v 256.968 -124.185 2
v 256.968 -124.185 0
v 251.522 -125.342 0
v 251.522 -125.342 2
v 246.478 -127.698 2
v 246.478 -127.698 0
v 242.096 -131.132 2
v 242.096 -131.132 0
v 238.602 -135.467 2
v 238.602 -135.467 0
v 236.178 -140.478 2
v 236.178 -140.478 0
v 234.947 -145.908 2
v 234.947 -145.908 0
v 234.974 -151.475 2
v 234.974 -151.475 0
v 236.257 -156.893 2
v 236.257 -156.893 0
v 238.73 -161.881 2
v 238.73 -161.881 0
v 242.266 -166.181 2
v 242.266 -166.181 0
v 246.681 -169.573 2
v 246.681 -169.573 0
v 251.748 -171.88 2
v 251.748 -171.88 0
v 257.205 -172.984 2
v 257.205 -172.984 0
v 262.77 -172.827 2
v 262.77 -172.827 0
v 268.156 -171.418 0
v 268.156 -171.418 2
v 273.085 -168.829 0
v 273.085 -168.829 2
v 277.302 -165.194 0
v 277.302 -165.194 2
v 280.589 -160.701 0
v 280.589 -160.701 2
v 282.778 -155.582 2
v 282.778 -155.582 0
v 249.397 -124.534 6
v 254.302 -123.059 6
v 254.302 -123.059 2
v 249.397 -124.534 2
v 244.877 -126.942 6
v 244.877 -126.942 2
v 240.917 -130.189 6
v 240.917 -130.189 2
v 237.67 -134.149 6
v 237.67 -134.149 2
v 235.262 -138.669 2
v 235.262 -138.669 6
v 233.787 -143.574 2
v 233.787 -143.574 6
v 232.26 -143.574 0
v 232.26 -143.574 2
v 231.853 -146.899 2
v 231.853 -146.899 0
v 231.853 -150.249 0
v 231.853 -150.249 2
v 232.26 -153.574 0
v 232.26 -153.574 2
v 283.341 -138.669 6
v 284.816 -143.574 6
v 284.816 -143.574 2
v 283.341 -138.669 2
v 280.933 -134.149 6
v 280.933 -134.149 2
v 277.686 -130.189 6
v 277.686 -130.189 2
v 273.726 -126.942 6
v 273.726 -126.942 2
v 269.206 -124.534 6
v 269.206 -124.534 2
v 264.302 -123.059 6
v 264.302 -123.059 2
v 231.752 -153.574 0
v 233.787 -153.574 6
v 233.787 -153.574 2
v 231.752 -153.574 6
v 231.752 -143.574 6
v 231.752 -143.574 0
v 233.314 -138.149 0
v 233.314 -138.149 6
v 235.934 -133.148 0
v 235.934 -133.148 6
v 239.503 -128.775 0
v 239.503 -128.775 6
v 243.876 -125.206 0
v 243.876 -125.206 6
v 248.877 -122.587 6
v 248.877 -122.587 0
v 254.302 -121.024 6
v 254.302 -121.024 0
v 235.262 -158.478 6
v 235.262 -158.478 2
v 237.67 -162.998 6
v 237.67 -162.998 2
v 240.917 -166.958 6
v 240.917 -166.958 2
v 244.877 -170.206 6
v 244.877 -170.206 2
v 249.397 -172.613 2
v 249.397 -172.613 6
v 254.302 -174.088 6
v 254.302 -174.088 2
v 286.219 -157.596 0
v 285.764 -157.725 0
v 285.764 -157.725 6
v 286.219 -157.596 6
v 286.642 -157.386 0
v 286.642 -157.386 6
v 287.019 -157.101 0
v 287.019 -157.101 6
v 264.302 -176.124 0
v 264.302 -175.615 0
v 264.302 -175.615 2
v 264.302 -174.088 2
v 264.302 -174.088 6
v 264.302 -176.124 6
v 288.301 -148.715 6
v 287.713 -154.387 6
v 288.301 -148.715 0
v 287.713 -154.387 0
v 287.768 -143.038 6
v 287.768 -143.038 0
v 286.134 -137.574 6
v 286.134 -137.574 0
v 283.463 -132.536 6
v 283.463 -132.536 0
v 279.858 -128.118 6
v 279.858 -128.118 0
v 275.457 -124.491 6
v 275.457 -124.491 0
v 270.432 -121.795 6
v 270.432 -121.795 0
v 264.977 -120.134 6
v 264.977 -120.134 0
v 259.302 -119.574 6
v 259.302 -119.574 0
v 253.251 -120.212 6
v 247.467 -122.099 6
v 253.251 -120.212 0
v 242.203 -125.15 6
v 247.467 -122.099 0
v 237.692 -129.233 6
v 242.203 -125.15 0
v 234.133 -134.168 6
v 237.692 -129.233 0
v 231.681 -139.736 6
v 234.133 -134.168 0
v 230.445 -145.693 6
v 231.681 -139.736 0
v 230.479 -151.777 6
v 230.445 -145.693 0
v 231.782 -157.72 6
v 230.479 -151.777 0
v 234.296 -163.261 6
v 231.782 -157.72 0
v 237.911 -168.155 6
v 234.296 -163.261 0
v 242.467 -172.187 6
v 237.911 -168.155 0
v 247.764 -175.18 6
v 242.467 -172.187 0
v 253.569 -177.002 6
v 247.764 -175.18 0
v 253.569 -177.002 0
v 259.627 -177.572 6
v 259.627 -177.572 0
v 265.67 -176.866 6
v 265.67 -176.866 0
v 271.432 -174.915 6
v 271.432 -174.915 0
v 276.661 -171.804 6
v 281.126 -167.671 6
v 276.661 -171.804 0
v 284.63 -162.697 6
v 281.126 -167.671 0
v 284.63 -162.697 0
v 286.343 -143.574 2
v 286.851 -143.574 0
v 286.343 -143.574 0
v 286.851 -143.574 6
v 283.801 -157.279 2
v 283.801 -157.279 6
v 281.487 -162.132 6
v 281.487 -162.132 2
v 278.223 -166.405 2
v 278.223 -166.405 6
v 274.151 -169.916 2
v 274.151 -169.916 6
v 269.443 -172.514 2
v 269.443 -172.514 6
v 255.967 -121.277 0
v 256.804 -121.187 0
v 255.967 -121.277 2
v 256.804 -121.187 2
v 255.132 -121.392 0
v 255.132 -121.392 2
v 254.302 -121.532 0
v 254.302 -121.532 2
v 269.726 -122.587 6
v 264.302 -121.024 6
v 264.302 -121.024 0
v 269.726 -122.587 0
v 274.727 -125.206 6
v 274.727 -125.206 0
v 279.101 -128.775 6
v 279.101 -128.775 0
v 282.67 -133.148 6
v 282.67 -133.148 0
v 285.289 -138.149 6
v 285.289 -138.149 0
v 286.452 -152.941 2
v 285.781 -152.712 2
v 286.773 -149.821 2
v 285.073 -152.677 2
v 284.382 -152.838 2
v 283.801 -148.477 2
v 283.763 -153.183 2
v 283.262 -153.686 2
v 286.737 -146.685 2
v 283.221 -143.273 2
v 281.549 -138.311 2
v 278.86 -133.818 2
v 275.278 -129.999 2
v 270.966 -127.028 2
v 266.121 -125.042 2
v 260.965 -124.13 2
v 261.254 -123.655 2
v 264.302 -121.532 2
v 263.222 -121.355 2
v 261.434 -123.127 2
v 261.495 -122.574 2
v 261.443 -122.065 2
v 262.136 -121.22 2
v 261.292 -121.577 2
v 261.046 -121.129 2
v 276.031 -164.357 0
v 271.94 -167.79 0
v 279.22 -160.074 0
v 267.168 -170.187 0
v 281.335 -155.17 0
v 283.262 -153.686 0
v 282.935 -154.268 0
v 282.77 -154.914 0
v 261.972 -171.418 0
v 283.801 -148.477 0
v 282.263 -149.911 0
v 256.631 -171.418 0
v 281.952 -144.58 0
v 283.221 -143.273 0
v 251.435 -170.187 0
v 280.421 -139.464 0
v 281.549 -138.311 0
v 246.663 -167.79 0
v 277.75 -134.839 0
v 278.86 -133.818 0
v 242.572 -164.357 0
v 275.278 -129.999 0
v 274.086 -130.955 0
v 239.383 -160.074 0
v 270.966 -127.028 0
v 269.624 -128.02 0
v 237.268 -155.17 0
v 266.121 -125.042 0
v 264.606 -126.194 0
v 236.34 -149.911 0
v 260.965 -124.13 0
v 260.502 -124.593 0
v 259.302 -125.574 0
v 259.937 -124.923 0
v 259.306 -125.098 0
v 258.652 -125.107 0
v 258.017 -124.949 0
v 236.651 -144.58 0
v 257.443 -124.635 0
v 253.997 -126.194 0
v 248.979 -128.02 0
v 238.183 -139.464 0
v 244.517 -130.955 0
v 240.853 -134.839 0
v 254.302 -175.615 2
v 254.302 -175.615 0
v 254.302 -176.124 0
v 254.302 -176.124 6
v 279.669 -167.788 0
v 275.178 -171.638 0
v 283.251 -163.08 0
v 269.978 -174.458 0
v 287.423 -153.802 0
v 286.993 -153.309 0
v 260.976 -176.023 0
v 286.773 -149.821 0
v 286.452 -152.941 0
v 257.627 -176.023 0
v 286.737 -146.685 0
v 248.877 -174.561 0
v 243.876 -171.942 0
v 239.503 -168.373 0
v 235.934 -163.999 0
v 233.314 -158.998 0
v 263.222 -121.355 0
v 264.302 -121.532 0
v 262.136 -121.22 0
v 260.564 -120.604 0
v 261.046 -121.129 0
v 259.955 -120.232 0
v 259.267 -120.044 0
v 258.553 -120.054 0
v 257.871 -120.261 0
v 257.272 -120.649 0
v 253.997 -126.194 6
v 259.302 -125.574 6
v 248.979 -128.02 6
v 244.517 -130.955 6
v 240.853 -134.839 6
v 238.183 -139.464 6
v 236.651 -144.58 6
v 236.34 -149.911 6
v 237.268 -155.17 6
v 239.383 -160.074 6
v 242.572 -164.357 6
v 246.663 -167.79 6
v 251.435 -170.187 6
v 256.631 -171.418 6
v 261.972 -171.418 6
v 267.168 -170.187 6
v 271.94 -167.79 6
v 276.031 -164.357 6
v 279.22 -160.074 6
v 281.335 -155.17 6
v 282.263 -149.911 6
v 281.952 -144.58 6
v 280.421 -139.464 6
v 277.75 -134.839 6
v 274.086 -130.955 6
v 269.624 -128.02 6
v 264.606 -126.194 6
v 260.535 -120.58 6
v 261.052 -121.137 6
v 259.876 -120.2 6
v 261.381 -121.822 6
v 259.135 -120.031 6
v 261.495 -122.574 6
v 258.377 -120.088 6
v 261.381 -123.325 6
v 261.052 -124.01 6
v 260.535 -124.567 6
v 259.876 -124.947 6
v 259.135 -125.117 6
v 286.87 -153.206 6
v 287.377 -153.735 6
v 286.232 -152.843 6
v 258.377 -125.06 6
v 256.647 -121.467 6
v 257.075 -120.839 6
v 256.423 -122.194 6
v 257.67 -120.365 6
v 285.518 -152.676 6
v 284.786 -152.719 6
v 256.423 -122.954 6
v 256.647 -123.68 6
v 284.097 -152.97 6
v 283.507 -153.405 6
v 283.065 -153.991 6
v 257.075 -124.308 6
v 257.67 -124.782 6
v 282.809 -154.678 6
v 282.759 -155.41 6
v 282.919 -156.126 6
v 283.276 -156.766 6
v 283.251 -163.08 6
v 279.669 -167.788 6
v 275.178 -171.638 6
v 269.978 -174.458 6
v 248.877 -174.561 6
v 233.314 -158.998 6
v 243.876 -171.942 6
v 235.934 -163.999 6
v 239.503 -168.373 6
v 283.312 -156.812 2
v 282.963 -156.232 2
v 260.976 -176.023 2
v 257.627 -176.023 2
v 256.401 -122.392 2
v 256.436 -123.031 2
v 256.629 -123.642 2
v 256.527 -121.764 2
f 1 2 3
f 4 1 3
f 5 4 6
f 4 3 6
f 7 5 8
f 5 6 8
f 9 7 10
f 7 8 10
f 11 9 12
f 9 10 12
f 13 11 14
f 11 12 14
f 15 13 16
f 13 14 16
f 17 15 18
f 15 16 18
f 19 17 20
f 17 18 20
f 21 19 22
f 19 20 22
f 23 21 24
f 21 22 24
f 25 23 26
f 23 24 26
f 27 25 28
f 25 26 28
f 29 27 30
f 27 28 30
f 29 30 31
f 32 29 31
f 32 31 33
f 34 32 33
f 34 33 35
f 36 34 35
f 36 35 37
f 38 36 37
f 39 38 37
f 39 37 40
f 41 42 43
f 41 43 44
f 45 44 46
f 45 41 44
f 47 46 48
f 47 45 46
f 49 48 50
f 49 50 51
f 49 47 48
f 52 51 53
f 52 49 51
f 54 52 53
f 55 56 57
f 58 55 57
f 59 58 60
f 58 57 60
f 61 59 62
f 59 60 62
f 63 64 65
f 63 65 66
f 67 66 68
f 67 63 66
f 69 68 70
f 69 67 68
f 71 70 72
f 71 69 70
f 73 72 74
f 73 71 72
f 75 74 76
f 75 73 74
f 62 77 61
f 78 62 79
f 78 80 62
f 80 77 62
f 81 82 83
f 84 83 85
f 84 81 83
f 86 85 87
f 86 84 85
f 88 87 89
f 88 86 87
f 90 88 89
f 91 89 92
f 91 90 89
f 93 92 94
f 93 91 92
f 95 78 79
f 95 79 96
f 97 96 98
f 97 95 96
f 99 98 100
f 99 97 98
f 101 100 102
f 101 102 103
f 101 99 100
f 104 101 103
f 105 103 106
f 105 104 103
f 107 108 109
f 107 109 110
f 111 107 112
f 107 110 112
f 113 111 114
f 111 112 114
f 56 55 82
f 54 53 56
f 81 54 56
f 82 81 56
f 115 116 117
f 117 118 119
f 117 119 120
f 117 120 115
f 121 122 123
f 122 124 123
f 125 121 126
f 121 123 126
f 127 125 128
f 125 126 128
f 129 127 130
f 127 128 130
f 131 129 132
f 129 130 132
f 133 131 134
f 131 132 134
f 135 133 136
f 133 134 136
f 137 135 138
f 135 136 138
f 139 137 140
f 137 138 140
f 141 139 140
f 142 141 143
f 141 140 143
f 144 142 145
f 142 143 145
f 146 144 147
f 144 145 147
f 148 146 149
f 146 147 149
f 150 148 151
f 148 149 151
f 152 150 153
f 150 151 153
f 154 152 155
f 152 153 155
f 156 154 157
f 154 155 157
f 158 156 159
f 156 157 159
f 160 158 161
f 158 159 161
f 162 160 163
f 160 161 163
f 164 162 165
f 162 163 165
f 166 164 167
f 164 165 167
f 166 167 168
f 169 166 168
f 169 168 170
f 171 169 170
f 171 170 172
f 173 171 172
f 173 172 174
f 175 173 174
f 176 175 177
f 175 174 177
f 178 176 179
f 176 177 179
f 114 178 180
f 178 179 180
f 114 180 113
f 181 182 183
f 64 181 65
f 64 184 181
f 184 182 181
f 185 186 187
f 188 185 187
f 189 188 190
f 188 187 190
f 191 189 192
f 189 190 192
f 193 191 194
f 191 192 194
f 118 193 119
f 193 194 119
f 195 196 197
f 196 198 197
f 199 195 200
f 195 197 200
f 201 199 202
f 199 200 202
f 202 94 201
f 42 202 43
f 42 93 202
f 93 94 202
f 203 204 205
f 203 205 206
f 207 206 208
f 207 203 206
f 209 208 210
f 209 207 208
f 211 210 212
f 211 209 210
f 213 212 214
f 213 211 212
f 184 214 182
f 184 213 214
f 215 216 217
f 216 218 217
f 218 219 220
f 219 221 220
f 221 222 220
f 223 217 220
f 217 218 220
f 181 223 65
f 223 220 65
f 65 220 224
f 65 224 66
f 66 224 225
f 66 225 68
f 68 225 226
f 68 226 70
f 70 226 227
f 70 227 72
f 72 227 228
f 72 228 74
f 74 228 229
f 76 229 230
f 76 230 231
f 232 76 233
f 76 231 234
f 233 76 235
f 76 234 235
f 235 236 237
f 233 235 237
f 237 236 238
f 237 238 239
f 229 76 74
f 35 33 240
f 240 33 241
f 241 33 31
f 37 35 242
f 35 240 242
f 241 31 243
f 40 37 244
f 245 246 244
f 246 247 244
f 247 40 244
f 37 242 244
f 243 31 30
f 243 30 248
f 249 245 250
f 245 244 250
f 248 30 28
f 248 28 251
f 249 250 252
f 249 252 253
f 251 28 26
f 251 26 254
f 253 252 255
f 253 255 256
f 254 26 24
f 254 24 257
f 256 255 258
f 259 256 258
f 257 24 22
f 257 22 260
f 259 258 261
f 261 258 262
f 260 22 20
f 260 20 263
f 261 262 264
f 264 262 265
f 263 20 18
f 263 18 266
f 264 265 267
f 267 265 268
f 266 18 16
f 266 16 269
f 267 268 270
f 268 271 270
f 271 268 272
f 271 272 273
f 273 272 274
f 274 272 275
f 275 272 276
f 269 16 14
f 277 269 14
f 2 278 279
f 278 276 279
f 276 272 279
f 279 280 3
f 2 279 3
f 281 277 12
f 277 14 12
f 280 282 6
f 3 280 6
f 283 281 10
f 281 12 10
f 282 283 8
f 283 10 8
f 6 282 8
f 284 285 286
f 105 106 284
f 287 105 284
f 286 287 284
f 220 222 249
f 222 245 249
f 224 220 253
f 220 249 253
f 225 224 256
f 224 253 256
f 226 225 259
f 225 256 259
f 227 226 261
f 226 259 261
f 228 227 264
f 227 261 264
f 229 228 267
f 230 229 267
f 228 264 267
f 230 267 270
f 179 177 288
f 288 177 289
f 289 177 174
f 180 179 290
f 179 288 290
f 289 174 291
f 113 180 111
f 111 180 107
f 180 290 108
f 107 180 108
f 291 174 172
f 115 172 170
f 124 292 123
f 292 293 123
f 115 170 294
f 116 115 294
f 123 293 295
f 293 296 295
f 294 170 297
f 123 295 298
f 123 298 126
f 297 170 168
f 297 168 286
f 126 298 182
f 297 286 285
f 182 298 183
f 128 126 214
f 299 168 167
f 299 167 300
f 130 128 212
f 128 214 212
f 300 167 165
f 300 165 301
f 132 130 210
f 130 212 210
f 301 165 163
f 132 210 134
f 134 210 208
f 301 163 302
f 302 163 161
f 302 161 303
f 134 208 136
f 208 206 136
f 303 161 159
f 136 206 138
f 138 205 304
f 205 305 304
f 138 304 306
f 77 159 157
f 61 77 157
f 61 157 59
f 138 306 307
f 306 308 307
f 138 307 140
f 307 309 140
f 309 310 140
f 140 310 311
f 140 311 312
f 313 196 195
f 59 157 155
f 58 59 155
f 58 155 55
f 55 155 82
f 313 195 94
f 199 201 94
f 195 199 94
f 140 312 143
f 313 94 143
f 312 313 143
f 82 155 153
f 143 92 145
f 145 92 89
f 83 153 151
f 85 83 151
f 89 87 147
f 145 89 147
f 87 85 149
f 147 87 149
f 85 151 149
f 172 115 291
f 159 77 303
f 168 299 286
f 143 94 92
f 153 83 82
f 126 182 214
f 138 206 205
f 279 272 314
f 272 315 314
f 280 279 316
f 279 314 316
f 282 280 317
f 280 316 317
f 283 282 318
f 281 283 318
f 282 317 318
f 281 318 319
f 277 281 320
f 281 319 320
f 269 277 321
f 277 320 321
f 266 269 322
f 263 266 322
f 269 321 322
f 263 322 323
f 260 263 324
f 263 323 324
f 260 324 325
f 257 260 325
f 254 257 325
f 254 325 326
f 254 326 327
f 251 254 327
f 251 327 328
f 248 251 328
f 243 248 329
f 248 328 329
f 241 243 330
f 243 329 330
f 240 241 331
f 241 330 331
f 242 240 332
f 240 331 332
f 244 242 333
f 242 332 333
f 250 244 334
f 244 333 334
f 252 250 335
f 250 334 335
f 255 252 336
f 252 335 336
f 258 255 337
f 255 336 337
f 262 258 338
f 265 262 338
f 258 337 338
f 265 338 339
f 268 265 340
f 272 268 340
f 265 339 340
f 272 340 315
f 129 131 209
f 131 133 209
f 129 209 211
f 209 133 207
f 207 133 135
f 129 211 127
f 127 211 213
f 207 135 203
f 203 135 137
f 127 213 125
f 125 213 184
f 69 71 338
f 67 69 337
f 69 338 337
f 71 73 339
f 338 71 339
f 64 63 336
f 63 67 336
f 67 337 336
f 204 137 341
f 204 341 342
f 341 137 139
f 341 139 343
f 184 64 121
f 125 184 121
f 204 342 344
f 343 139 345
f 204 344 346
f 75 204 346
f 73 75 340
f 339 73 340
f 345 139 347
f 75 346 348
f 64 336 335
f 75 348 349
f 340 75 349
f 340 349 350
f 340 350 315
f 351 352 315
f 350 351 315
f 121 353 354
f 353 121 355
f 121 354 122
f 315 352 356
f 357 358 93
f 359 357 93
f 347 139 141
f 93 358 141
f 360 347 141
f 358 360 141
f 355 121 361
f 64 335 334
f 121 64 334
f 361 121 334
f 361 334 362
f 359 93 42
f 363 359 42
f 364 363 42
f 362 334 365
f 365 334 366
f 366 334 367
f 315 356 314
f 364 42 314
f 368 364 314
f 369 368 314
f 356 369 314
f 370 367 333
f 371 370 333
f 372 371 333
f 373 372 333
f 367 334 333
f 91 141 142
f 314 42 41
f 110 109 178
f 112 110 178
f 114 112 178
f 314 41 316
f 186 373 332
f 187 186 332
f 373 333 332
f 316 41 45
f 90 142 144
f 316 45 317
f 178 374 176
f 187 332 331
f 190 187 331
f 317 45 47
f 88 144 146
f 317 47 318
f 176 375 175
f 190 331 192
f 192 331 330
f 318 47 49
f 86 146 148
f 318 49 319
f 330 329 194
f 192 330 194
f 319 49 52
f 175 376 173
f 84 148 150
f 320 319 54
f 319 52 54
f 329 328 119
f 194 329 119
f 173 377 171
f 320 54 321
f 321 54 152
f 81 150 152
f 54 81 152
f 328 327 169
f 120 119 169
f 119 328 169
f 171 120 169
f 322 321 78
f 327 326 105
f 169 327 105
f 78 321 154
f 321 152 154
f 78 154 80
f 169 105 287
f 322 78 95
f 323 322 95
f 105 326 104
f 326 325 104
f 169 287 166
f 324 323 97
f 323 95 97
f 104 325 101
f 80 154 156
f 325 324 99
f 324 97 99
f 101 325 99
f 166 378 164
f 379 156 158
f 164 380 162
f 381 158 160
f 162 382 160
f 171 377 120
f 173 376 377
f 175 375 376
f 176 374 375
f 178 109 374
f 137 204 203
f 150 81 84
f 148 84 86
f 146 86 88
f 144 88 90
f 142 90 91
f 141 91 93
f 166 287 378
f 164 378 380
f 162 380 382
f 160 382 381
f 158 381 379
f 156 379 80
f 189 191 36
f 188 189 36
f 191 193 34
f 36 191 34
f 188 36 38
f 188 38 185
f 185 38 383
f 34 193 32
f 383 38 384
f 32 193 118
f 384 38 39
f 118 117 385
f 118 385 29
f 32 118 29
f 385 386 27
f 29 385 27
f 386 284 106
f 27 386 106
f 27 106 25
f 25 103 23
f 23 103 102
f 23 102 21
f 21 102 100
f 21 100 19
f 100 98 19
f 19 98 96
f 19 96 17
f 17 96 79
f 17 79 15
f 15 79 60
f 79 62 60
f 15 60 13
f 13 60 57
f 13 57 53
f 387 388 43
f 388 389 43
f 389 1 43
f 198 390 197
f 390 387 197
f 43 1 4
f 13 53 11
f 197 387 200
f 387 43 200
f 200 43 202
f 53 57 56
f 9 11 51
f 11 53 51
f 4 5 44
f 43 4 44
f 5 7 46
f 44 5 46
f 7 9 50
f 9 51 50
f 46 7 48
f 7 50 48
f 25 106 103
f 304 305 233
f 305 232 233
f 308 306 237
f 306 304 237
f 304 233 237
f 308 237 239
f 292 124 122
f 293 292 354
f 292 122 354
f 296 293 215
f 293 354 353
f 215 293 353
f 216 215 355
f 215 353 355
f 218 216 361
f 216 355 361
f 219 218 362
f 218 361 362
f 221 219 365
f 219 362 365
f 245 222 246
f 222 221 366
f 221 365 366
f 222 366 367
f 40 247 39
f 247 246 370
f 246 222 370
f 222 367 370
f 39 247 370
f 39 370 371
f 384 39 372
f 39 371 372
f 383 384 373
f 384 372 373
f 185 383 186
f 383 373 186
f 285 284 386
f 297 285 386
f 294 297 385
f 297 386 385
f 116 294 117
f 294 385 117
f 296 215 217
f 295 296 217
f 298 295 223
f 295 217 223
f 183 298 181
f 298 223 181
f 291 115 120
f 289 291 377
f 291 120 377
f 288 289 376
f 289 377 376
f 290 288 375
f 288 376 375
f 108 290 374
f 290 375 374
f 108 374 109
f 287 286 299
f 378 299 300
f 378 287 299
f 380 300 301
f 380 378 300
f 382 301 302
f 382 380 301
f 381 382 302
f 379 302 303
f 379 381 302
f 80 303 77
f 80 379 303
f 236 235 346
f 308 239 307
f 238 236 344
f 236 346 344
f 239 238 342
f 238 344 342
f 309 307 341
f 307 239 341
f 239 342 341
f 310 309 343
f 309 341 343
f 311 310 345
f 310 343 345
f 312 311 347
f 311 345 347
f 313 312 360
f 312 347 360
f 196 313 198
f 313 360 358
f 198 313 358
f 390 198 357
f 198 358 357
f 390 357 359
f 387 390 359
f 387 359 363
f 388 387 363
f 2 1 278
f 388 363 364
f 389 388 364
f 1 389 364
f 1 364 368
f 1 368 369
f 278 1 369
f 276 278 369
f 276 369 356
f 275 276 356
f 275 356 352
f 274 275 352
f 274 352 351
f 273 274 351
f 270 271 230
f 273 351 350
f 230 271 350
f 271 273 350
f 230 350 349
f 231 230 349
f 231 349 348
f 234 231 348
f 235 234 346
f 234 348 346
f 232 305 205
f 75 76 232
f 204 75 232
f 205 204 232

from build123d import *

# Parameters (mm, degrees)
CUT_EXTRUDE1_DEPTH = 7
SKETCH4_R          = 2.55
CUT_EXTRUDE2_DEPTH = 7


with BuildPart() as part:
    # Sketch2 → Revolve1 (revolve)
    with BuildSketch(Plane.ZY.offset(-259.301545348)):
        Polygon((0, -124.073704322), (0, -125.573704322), (6, -125.573704322), (6, -119.573704322), (0, -119.573704322), (0, -121.073704322), (2, -121.073704322), (2, -124.073704322), align=None)
    revolve(axis=Axis((259.301545348, -148.573704322, 22.865), (0, 0, 1)))

    # Sketch3 → Cut-Extrude1 (cut, through all)
    with BuildSketch(Plane.XY.offset(6)):
        with BuildLine():
            Line((254.301545348, -174.088405967), (254.301545348, -176.12365895))
            ThreePointArc((254.301545348, -176.12365895), (239.502555475, -168.372694195), (231.75159072, -153.573704322))
            Line((231.75159072, -153.573704322), (233.786843704, -153.573704322))
            ThreePointArc((233.786843704, -153.573704322), (240.916769037, -166.958480633), (254.301545348, -174.088405967))
        make_face()
        with BuildLine():
            Line((264.301545348, -174.088405967), (264.301545348, -176.12365895))
            ThreePointArc((264.301545348, -176.12365895), (279.100535221, -168.372694195), (286.851499976, -153.573704322))
            Line((286.851499976, -153.573704322), (284.816246992, -153.573704322))
            ThreePointArc((284.816246992, -153.573704322), (277.686321659, -166.958480633), (264.301545348, -174.088405967))
        make_face()
        with BuildLine():
            Line((286.851499976, -143.573704322), (284.816246992, -143.573704322))
            ThreePointArc((284.816246992, -143.573704322), (277.686321659, -130.188928011), (264.301545348, -123.059002678))
            Line((264.301545348, -123.059002678), (264.301545348, -121.023749694))
            ThreePointArc((264.301545348, -121.023749694), (279.100535221, -128.774714449), (286.851499976, -143.573704322))
        make_face()
        with BuildLine():
            Line((254.301545348, -121.023749694), (254.301545348, -123.059002678))
            ThreePointArc((254.301545348, -123.059002678), (240.916769037, -130.188928011), (233.786843704, -143.573704322))
            Line((233.786843704, -143.573704322), (231.75159072, -143.573704322))
            ThreePointArc((231.75159072, -143.573704322), (239.502555475, -128.774714449), (254.301545348, -121.023749694))
        make_face()
    extrude(amount=-CUT_EXTRUDE1_DEPTH, mode=Mode.SUBTRACT)

    # Sketch4 → Cut-Extrude2 (cut, through all)
    with BuildSketch(Plane.XY.offset(6)):
        with Locations((258.944661735, -122.573704322)):
            Circle(SKETCH4_R)
        with Locations((285.301545348, -155.216820709)):
            Circle(SKETCH4_R)
        with Locations((252.658428961, -181.573704322)):
            Circle(SKETCH4_R)
        with Locations((226.301545348, -148.930587935)):
            Circle(SKETCH4_R)
    extrude(amount=-CUT_EXTRUDE2_DEPTH, mode=Mode.SUBTRACT)


solid = part.part
